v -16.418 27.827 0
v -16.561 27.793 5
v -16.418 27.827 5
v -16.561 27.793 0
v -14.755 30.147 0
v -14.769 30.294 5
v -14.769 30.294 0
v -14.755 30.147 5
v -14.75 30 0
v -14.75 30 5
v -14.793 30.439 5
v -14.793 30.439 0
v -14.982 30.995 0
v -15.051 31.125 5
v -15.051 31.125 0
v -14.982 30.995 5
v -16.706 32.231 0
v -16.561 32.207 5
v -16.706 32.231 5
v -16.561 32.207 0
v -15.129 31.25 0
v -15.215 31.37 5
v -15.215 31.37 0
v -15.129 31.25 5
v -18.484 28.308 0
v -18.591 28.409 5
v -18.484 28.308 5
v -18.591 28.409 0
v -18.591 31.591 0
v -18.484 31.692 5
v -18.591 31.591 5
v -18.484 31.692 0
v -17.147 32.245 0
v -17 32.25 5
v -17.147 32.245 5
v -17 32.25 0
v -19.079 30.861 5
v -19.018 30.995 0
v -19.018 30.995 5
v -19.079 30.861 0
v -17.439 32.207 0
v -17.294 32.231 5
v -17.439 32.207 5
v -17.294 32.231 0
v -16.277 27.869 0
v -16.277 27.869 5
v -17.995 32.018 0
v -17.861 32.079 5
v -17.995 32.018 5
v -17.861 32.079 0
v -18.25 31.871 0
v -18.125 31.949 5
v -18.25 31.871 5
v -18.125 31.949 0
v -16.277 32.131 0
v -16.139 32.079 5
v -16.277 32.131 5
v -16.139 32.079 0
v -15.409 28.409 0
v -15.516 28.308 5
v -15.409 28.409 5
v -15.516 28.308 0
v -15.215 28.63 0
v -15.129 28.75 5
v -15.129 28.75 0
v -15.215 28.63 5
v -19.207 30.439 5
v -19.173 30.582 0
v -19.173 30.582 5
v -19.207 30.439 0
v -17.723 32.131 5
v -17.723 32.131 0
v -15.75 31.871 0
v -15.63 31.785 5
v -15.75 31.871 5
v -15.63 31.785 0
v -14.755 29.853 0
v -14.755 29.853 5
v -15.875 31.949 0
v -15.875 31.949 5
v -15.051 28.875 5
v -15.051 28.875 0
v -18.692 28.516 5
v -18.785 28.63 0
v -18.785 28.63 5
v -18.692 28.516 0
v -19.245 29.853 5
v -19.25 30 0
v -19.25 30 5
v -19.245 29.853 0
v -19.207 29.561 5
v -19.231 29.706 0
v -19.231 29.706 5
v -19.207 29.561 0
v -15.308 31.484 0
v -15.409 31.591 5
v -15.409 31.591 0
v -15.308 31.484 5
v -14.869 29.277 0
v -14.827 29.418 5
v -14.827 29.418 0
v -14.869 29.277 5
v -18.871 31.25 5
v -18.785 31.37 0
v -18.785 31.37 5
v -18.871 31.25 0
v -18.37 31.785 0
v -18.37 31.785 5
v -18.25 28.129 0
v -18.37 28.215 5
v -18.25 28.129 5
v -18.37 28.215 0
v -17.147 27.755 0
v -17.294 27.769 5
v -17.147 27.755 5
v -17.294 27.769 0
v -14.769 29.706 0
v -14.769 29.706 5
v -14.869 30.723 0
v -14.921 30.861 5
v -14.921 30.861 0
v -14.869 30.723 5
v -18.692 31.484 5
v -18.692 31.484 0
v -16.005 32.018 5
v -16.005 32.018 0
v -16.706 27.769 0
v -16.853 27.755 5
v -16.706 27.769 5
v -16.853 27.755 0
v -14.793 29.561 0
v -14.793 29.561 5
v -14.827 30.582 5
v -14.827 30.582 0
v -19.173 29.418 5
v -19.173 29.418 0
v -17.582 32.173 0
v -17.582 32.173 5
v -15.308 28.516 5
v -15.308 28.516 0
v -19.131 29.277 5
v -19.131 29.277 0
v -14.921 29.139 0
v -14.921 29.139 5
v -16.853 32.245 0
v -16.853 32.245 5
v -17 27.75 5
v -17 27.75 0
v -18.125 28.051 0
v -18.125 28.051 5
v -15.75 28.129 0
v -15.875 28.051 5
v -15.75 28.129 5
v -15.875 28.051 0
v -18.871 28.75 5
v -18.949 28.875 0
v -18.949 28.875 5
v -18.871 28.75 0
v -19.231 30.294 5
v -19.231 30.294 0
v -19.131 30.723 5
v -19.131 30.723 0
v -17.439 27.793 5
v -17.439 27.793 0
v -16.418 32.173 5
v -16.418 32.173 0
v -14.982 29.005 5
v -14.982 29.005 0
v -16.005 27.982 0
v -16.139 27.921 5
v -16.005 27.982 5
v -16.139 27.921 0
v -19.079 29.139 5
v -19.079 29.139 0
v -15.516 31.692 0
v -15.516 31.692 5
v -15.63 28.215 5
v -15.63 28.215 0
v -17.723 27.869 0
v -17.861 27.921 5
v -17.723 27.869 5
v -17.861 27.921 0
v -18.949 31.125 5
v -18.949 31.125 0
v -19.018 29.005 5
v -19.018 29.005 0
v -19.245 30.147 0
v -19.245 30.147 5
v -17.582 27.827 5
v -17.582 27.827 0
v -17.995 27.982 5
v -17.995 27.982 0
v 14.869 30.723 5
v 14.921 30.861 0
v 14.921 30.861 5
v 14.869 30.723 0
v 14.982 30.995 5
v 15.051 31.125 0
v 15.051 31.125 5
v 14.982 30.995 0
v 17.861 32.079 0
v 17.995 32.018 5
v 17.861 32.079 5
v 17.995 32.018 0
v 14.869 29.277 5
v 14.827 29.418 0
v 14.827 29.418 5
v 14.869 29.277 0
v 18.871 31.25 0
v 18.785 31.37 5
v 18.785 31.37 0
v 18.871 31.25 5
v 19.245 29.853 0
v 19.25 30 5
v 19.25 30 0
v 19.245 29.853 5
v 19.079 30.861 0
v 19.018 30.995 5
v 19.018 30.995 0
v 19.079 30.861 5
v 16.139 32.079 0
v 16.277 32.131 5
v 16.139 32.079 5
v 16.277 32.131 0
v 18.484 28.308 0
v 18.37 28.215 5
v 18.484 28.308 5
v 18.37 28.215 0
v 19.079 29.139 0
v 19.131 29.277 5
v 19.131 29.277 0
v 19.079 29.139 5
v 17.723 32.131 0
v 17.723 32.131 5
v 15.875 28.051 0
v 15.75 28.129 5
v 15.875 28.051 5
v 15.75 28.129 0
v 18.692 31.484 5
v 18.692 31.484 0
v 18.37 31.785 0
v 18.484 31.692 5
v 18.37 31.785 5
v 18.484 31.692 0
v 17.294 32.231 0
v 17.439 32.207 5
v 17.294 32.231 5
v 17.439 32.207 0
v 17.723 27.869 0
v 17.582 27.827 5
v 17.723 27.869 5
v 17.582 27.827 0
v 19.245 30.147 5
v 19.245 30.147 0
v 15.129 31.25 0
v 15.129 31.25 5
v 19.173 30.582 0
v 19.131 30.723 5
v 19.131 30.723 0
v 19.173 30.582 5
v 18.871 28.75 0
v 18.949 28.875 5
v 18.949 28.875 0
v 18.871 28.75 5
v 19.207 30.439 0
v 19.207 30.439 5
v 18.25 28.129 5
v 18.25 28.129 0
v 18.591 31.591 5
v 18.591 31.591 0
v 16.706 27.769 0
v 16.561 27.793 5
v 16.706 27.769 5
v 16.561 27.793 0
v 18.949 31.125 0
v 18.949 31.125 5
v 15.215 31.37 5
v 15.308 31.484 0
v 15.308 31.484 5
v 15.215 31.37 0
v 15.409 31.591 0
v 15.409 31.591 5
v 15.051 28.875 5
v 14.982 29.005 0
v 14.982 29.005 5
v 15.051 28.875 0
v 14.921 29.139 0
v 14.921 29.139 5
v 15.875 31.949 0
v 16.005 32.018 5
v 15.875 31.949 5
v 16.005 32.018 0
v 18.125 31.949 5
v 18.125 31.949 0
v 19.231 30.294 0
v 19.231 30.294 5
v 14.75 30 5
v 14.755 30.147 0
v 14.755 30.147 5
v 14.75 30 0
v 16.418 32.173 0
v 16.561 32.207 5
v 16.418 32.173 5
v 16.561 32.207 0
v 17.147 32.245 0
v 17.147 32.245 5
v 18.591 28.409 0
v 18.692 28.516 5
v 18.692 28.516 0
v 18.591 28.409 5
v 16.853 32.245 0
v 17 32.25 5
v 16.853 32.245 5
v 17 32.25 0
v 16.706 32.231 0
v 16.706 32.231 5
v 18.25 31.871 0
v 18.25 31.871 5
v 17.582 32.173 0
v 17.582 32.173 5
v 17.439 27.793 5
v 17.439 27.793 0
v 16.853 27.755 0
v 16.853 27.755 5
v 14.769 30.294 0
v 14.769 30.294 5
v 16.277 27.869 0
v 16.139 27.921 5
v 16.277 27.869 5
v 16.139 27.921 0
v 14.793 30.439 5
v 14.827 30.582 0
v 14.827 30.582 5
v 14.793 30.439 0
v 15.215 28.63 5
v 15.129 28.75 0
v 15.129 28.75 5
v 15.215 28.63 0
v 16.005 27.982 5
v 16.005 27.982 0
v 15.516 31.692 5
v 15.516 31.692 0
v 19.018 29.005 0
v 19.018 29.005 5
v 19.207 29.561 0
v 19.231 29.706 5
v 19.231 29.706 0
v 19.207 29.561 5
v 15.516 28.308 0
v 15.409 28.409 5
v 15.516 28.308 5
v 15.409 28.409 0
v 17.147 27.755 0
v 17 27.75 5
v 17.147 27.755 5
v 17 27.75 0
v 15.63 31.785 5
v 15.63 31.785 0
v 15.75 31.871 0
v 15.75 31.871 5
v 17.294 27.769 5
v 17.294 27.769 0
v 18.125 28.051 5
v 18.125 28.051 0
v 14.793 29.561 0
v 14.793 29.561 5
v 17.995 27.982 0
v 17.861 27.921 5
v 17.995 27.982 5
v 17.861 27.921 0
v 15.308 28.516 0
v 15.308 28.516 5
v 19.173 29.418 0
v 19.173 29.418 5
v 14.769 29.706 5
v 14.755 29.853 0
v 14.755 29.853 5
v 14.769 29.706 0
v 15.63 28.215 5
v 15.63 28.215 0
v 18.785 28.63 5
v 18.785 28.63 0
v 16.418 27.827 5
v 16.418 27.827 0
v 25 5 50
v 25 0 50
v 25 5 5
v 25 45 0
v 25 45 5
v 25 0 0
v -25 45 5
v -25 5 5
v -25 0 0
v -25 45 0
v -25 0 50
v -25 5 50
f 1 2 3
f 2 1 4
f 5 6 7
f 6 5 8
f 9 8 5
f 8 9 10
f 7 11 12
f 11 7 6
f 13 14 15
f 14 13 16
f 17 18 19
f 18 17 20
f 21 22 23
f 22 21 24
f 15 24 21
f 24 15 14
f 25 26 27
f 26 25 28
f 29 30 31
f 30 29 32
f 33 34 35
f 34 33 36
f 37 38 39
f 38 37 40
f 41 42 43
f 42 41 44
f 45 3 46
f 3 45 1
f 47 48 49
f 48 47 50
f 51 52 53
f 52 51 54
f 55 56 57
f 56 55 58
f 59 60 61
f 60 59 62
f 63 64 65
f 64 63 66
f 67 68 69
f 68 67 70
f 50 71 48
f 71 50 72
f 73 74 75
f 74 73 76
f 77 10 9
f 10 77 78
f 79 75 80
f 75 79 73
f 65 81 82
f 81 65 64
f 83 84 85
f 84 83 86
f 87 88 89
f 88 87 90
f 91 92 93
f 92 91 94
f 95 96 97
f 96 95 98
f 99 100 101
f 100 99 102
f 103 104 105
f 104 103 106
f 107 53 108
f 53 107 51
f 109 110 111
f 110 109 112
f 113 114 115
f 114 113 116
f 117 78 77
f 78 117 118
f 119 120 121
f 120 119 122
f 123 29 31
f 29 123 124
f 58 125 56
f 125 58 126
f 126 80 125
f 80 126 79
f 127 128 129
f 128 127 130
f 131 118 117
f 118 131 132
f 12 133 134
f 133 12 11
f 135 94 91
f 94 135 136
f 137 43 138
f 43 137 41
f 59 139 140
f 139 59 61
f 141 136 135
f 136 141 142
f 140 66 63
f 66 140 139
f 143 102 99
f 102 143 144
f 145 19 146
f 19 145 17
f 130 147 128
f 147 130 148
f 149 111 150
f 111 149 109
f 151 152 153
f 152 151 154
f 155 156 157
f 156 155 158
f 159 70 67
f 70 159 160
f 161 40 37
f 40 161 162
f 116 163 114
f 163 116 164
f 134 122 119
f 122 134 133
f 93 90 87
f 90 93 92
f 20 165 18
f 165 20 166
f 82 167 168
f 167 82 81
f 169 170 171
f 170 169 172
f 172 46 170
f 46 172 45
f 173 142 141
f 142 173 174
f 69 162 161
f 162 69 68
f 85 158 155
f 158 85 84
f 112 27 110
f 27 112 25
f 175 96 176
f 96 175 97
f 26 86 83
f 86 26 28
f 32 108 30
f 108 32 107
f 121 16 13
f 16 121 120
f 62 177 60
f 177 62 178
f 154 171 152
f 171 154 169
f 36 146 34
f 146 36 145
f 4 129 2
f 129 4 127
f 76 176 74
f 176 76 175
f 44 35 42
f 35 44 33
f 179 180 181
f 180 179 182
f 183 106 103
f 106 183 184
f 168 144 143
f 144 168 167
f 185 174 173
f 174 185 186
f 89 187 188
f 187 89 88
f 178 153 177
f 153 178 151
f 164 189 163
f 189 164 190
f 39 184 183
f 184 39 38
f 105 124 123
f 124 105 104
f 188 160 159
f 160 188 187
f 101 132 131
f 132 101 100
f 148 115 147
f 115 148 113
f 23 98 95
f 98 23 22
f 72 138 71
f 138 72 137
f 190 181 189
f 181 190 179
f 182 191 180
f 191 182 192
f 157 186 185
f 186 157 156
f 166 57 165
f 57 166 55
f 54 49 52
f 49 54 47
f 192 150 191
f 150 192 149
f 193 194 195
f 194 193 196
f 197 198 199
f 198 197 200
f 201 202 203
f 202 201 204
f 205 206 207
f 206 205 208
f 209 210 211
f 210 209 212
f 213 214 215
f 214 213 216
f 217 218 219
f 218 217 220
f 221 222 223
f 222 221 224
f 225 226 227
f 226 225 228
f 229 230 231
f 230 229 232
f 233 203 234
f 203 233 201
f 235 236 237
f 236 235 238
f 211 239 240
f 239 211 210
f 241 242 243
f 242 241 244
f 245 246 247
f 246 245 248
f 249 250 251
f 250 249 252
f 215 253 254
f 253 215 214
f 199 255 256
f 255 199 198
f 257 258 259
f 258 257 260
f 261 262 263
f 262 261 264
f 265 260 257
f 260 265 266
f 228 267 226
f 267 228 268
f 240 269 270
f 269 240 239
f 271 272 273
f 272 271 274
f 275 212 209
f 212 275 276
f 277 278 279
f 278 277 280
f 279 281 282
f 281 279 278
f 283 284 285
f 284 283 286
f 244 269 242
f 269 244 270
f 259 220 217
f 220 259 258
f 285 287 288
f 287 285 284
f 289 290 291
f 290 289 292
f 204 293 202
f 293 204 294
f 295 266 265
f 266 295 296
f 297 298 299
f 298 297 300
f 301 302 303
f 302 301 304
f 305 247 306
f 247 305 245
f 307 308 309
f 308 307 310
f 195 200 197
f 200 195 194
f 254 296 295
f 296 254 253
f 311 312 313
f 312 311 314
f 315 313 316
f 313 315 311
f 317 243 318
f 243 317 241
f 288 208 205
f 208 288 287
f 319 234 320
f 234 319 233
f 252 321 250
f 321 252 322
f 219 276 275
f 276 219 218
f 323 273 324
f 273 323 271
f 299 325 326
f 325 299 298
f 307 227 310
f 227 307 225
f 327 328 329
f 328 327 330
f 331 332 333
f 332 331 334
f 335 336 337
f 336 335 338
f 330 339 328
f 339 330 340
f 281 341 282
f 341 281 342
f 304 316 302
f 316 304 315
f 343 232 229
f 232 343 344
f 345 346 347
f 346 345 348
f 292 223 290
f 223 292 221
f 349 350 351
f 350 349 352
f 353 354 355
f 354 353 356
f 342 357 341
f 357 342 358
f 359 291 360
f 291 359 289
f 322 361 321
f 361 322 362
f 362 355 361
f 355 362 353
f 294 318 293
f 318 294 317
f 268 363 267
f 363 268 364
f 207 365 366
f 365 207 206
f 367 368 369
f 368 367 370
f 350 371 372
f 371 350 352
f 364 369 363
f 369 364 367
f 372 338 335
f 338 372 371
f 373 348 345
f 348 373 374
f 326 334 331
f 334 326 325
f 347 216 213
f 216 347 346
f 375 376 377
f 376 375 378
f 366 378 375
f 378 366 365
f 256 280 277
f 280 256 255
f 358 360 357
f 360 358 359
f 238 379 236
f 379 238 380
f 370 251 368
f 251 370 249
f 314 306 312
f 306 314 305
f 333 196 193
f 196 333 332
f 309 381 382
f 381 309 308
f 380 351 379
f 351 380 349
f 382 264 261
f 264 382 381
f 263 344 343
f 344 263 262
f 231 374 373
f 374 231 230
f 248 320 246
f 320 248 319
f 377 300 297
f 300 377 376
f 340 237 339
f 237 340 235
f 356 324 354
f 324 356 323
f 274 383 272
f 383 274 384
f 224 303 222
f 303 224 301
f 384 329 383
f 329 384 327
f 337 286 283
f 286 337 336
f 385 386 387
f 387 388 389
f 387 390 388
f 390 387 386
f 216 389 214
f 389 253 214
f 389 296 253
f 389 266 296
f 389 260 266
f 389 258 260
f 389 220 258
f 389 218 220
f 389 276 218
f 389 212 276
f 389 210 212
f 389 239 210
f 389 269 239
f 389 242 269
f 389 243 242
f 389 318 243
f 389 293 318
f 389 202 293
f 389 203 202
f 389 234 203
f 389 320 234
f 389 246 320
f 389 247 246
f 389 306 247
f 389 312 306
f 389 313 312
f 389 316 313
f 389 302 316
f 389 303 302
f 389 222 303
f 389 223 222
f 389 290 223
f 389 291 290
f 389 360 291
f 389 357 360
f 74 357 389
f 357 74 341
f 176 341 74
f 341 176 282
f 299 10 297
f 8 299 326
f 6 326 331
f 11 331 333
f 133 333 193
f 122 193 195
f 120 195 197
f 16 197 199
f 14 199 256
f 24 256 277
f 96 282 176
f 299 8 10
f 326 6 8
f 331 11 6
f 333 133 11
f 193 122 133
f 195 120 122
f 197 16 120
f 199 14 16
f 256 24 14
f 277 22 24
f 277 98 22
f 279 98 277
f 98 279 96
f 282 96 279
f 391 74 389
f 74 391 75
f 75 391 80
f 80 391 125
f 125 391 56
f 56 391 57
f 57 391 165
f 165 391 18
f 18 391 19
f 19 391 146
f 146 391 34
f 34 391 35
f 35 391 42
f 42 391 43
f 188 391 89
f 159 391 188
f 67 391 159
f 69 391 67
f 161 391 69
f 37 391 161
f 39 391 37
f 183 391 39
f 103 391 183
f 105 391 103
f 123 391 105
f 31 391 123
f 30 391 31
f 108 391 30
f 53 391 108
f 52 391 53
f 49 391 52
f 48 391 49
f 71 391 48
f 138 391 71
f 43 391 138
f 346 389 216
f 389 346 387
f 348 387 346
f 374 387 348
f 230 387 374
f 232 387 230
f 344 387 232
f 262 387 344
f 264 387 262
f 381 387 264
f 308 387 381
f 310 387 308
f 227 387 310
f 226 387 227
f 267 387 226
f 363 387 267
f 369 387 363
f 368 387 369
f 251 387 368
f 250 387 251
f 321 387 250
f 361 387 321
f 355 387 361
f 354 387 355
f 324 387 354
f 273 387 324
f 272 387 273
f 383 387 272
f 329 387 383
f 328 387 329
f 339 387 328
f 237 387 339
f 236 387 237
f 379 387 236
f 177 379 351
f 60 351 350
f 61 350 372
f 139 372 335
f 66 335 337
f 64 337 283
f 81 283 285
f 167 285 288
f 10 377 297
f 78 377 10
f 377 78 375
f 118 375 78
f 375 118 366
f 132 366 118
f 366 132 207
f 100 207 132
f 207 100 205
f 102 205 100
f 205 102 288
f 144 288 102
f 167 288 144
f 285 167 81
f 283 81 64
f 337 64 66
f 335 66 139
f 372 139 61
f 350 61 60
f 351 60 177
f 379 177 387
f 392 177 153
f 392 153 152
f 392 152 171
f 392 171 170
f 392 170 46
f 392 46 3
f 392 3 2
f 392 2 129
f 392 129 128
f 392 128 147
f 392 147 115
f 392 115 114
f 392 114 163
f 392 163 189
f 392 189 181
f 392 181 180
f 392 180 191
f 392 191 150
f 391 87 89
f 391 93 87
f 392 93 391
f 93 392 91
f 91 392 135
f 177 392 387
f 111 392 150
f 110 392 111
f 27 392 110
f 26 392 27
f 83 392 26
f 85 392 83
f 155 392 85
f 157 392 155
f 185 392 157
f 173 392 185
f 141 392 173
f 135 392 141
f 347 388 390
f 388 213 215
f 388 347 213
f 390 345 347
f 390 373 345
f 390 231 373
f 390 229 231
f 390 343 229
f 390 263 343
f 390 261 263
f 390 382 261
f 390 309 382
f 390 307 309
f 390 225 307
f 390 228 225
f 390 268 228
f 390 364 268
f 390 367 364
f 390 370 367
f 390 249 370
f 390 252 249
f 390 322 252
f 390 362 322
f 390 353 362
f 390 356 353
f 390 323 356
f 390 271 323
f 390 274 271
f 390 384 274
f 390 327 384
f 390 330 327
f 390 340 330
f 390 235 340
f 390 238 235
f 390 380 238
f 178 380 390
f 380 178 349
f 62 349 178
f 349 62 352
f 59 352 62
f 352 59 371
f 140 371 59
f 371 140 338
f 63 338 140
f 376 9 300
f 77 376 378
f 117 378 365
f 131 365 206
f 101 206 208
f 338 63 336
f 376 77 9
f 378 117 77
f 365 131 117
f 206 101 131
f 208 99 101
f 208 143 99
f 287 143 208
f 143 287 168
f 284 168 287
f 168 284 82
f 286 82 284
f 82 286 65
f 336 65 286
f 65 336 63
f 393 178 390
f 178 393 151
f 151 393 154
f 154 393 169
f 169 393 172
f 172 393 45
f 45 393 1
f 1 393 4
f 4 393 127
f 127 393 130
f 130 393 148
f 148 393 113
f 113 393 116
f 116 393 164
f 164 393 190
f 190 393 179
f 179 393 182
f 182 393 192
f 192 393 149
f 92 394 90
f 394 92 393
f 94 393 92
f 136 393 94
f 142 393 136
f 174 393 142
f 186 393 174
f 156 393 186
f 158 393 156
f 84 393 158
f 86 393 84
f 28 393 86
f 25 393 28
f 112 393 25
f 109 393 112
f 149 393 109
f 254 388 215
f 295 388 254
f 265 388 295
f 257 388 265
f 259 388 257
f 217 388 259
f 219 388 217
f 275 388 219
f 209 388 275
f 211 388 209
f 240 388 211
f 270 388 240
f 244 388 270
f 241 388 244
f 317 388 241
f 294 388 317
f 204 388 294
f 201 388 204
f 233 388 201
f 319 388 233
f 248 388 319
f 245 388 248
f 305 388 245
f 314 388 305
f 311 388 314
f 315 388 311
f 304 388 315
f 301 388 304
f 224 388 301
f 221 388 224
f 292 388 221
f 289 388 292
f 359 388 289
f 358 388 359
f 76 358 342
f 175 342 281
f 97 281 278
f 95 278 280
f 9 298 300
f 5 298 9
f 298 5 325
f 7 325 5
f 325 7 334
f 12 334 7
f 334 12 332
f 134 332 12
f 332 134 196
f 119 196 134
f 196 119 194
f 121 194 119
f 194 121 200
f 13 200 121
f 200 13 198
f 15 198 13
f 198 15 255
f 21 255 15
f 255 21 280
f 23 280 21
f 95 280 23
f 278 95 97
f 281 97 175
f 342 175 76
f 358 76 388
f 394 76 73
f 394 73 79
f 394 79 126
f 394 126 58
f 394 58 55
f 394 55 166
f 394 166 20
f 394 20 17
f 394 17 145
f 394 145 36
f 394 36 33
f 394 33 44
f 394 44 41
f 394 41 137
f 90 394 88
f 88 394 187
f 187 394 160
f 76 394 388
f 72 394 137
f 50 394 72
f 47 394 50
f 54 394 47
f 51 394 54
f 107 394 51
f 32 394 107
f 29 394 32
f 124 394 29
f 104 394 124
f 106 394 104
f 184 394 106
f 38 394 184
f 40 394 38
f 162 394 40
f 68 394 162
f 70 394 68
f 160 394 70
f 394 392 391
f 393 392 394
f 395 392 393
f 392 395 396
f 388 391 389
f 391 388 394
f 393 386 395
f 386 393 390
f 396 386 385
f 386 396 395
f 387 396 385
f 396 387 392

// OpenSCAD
// L-shaped mounting bracket for NEMA 17 stepper motor (e.g. syringe pump)
// Print orientation: base plate on bed (z = 0), vertical plate builds upward.

// ---------------- Parameters ----------------
base_x0      = -25;   // base plate X start
base_x1      = 25;    // base plate X end
base_y0      = 0;     // base plate Y start
base_y1      = 45;    // base plate Y end
base_z0      = 0;     // base plate Z start
base_z1      = 5;     // base plate Z end

hole_x       = -17;   // M4 hole X position (first hole)
hole_y       = 30;    // M4 hole Y position (first hole)
hole_d       = 4.5;   // M4 hole diameter

motor_x0     = -25;   // motor plate X start
motor_x1     = 25;    // motor plate X end
motor_y0     = 0;     // motor plate Y start
motor_y1     = 5;     // motor plate Y end
motor_z0     = 0;     // motor plate Z start
motor_z1     = 50;    // motor plate Z end

boss_d       = 23;    // motor boss hole diameter
boss_x       = 0;     // boss hole X centre
boss_z       = 28;    // boss hole Z centre

screw_d      = 3.4;   // M3 screw hole diameter
screw_n      = 4;     // number of screw holes
screw_a      = 31;    // screw pattern size (square side)

gusset_t     = 5;     // gusset thickness (X)
gusset_leg   = 20;    // gusset leg length (Y and Z)
gusset_x0    = -25;   // left gusset X start
gusset_x1    = -20;   // left gusset X end

eps          = 0.5;   // cutter overshoot past faces

$fn = 96;

// ---------------- Model ----------------
union() {
    // Base plate with M4 through-holes
    difference() {
        translate([base_x0, base_y0, base_z0])
            cube([base_x1 - base_x0, base_y1 - base_y0, base_z1 - base_z0]);

        for (h = [hole_x, hole_x + 34]) {
            translate([h, hole_y, -eps])
                cylinder(d = hole_d, h = base_z1 - base_z0 + 2 * eps);
        }
    }

    // Vertical motor plate with boss hole and M3 screw holes
    difference() {
        translate([motor_x0, motor_y0, motor_z0])
            cube([motor_x1 - motor_x0, motor_y1 - motor_y0, motor_z1 - motor_z0]);

        // Boss hole along Y
        translate([boss_x, -eps, boss_z])
            rotate([90, 0, 0])
                cylinder(d = boss_d, h = motor_y1 - motor_y0 + 2 * eps);

        // Screw holes on square pattern
        for (i = [0 : screw_n - 1]) {
            a = screw_a + screw_d;
            r = a / 2;
            translate([0, 0, motor_z0])
                rotate([0, 90, 0])
                    translate([0, r, 0])
                        cylinder(d = screw_d, h = motor_z1 - motor_z0 + eps);
        }
    }

    // Left gusset (right triangle in YZ plane)
    translate([gusset_x0, 5, 5])
        rotate([90, 0, 0])
            linear_extrude(height = gusset_t)
                polygon([0, 0, gusset_leg, 0, gusset_leg, gusset_leg]);

    // Right gusset (right triangle in YZ plane)
    translate([gusset_x1, 5, 5])
        rotate([90, 0, 0])
            linear_extrude(height = gusset_t)
                polygon([0, 0, gusset_leg, 0, gusset_leg, gusset_leg]);
}
